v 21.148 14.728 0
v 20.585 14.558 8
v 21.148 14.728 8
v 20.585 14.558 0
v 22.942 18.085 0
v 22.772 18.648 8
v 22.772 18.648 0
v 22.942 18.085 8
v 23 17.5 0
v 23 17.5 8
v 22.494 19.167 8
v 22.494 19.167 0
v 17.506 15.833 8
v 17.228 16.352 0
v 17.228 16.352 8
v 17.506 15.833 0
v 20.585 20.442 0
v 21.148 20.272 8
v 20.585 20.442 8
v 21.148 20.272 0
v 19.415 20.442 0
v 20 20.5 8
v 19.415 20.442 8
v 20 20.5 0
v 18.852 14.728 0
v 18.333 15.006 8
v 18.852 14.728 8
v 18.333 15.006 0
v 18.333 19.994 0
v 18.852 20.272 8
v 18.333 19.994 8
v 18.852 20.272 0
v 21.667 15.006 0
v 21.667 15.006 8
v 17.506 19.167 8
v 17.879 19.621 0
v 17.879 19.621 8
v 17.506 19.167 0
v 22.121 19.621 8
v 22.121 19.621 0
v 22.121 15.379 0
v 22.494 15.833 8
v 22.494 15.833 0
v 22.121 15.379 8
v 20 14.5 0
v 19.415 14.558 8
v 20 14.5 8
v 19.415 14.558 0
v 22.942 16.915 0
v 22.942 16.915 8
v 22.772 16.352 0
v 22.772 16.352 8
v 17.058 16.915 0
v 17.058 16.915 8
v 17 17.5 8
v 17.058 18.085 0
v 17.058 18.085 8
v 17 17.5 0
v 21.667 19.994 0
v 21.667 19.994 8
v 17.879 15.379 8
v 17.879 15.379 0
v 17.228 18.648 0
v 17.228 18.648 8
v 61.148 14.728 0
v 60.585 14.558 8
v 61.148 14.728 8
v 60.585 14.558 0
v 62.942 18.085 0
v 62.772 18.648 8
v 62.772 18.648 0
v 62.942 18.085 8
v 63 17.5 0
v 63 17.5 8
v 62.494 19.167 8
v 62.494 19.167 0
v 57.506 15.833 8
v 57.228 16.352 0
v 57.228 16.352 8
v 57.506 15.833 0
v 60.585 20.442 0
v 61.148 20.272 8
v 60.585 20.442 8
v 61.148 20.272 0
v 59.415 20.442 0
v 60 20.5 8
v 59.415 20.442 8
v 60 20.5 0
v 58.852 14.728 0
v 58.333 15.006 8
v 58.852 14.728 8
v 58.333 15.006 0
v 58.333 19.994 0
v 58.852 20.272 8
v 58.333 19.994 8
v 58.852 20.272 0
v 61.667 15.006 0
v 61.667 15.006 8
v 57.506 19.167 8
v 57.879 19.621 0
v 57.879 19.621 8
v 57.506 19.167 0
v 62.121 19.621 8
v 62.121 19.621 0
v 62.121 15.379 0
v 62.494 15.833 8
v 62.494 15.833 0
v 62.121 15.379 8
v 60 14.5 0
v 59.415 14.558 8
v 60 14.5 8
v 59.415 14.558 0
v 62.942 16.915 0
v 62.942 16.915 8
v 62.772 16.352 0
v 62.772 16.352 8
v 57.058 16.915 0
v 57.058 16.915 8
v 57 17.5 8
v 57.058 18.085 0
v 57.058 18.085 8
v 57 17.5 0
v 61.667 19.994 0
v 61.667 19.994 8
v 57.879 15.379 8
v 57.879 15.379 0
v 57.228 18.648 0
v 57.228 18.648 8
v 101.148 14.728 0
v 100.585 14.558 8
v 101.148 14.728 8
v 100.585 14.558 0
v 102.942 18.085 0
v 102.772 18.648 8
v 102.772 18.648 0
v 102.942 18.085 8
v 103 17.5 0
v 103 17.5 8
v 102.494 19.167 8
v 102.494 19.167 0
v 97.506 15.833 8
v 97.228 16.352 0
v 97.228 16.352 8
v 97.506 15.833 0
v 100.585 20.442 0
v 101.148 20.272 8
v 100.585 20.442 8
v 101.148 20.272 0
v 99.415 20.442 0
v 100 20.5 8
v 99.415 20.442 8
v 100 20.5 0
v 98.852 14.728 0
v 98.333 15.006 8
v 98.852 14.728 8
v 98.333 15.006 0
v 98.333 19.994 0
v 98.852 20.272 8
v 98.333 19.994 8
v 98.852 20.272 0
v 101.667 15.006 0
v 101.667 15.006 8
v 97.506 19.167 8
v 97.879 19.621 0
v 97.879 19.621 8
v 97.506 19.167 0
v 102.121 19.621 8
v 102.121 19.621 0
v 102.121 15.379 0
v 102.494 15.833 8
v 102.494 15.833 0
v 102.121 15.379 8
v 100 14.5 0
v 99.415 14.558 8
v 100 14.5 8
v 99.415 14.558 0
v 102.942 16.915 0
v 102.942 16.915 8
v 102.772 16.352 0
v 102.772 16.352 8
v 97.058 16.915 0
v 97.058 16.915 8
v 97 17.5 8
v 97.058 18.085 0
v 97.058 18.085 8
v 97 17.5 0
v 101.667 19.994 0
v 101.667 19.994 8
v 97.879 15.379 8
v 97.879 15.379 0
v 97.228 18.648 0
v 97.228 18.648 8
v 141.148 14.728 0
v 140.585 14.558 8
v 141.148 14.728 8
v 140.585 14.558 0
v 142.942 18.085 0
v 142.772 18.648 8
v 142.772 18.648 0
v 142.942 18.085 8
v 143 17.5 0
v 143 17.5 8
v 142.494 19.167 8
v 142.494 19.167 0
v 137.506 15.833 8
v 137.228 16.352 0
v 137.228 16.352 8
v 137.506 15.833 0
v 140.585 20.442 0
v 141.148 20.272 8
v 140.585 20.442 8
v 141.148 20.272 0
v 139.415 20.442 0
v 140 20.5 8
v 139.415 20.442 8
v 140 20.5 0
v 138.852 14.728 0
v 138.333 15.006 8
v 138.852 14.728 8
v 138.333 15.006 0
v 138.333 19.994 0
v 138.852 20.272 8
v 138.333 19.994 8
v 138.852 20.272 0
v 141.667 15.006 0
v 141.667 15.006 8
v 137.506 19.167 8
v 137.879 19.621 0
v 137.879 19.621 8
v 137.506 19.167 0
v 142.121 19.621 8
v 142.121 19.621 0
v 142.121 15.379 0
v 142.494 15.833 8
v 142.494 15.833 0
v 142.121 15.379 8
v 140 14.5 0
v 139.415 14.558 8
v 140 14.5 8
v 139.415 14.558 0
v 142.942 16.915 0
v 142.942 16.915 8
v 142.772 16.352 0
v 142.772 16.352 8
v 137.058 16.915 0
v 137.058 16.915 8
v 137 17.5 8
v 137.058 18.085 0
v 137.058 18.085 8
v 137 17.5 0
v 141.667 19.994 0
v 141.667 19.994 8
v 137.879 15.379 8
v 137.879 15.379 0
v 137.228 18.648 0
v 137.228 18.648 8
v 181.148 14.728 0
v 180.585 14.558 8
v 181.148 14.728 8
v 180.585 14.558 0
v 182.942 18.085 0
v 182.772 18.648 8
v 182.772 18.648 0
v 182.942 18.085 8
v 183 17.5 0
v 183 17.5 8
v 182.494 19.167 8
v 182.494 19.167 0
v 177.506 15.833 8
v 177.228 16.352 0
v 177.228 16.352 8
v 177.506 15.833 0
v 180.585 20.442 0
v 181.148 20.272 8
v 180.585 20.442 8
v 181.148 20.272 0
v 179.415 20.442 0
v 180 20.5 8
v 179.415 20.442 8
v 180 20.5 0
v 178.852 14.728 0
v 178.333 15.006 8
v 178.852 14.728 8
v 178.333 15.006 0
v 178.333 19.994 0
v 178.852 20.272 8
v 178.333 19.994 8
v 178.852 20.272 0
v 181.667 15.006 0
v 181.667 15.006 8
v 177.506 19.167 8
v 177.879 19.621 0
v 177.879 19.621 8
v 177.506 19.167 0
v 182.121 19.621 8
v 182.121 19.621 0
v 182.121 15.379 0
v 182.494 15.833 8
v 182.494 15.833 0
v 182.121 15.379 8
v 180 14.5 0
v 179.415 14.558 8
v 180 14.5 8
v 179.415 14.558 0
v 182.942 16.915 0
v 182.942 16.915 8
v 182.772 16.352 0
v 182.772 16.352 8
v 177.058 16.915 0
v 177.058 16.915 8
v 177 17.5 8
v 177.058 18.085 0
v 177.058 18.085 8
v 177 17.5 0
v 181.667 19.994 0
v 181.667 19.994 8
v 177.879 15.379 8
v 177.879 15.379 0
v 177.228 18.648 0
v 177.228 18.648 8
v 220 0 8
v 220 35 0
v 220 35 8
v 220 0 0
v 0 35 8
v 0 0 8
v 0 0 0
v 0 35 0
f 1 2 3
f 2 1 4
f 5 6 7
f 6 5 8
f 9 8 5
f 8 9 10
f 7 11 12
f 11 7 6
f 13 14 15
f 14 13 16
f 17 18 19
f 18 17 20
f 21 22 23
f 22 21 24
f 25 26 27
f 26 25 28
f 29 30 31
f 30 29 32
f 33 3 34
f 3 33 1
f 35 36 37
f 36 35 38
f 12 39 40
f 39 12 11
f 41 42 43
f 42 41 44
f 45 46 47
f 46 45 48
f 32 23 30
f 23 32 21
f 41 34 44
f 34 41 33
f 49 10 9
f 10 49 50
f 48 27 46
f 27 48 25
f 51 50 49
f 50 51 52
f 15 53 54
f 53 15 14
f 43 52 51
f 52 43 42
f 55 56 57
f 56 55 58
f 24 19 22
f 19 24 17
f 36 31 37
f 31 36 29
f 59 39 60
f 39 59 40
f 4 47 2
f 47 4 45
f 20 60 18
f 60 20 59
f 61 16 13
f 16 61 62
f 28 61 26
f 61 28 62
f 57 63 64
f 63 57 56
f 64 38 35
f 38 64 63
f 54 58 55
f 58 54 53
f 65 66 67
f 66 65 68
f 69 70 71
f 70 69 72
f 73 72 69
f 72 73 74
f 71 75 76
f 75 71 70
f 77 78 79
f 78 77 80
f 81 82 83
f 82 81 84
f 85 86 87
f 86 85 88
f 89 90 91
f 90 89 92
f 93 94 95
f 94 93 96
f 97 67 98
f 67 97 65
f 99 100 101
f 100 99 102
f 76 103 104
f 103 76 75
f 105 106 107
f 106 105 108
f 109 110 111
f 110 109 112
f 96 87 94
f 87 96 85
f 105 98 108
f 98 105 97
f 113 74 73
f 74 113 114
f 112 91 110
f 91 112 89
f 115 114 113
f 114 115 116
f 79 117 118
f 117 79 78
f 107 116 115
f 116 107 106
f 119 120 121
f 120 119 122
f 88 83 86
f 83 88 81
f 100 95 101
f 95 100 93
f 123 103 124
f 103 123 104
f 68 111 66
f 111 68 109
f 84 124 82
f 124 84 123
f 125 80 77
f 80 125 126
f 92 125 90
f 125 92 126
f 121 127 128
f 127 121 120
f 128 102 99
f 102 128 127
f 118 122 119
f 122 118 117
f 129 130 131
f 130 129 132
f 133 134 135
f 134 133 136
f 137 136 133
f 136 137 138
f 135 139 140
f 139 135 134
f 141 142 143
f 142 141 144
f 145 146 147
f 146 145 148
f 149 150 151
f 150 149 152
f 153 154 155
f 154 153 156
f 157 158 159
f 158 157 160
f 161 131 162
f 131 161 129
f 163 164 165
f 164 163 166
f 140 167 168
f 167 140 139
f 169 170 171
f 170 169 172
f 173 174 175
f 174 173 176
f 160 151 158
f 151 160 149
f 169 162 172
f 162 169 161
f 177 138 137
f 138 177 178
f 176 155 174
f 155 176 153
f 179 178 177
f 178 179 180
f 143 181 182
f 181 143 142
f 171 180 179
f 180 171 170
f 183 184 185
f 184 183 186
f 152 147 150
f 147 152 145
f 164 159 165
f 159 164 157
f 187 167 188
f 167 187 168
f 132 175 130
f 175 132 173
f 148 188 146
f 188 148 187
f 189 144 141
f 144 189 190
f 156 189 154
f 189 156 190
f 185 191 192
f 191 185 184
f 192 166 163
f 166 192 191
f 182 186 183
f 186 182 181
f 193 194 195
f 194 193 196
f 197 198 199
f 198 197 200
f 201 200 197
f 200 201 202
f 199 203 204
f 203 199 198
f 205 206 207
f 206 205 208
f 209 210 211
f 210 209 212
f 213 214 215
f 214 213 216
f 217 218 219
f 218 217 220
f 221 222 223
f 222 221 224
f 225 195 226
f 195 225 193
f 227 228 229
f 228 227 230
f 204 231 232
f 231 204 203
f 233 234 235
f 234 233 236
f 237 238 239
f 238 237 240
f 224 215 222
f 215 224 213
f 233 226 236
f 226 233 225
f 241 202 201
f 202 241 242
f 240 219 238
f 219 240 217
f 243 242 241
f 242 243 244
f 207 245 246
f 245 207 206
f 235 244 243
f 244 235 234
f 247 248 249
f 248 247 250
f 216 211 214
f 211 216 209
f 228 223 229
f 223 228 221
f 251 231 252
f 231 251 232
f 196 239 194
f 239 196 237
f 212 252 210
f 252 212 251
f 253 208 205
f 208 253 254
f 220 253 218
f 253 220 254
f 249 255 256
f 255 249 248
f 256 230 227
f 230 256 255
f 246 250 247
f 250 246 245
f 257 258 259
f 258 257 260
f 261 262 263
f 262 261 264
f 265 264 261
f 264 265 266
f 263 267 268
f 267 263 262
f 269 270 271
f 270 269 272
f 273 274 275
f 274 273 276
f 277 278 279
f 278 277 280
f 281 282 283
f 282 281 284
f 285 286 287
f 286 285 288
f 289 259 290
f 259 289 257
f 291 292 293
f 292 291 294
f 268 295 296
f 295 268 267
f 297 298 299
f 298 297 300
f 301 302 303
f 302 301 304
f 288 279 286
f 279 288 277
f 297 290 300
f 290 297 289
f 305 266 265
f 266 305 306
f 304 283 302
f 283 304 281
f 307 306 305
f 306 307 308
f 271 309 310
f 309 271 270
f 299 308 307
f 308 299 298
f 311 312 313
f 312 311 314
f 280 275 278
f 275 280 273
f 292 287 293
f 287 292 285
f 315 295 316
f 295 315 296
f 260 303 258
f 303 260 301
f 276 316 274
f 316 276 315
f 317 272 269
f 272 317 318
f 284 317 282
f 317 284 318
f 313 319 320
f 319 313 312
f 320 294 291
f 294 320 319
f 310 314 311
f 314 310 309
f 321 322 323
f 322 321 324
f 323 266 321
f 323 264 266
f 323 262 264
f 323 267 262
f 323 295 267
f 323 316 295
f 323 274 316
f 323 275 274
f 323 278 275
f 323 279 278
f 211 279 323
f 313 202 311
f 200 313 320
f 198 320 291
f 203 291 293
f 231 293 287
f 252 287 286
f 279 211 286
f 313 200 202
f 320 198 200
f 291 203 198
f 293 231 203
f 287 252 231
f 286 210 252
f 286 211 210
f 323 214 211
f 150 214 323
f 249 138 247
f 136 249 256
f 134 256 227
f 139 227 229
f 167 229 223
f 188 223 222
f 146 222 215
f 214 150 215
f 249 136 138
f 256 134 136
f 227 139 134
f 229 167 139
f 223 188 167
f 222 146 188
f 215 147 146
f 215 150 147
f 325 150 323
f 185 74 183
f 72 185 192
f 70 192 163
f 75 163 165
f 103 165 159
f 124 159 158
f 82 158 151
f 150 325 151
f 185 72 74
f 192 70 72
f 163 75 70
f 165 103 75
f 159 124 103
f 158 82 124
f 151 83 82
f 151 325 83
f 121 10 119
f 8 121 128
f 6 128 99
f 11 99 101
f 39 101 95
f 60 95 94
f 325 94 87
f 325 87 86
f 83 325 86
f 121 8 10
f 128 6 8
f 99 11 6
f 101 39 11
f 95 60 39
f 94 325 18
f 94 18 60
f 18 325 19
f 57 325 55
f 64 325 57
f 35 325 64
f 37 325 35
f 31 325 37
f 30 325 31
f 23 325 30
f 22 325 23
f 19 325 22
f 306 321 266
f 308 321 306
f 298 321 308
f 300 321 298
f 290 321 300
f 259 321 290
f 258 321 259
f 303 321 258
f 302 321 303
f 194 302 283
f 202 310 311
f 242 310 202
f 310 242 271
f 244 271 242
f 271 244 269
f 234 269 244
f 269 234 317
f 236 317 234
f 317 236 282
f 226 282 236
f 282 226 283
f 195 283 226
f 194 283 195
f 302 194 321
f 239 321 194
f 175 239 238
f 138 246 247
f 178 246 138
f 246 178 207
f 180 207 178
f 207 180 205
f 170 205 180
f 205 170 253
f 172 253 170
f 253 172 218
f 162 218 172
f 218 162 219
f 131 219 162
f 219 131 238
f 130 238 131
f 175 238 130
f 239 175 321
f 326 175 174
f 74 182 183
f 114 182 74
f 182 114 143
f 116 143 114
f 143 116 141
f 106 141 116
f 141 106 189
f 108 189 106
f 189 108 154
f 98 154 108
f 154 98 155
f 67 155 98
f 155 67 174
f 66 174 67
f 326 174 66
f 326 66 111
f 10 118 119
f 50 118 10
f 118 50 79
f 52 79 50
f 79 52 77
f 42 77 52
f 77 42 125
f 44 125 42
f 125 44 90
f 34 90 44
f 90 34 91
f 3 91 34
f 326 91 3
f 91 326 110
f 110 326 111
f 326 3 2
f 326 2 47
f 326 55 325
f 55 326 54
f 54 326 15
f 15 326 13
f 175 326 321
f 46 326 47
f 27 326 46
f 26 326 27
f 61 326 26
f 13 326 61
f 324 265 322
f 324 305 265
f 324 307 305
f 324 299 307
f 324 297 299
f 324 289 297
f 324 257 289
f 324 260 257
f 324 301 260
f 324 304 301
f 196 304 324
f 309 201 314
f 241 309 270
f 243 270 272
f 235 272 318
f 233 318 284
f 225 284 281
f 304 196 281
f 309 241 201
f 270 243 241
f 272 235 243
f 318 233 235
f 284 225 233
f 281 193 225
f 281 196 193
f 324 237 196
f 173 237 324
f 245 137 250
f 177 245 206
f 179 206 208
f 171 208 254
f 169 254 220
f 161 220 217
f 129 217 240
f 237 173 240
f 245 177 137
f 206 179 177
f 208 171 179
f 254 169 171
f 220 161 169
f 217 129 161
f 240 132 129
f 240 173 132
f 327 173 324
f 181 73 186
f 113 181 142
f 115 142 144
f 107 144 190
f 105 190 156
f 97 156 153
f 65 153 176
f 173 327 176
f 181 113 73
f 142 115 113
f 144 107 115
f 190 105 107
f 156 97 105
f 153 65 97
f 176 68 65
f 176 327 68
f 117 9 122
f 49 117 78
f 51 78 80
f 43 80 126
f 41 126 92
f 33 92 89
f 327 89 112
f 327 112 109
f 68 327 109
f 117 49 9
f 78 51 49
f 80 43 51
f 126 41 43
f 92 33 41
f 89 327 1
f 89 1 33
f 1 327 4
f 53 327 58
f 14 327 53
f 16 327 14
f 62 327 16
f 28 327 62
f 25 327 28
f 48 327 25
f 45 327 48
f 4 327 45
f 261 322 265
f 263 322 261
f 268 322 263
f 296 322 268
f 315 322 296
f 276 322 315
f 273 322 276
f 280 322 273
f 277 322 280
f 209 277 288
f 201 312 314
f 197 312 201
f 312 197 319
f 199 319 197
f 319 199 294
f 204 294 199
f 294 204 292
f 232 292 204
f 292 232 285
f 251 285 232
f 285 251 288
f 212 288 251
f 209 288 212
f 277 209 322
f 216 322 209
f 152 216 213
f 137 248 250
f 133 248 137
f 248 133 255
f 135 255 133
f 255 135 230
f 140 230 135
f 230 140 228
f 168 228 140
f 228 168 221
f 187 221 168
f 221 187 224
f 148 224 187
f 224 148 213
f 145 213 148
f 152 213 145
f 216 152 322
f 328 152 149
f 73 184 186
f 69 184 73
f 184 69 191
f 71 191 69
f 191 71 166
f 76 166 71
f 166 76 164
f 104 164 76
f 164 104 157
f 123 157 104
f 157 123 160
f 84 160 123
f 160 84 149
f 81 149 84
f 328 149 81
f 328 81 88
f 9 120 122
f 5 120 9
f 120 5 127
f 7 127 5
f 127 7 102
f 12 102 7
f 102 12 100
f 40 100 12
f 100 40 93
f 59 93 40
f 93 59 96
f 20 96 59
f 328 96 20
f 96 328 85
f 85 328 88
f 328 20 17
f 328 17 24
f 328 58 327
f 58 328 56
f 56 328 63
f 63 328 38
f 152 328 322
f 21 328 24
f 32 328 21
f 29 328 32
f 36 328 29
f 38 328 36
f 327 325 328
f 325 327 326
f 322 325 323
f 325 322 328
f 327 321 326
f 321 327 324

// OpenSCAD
$fn = 32;

// ----------------------------------------------------------------------
// Long rail: 200-250 mm mounting rail
// ----------------------------------------------------------------------

// --- parameters (mm) ---
rail_l = 220;             // rail length, X
rail_w = 35;              // rail width, Y
rail_t = 8;               // rail thickness, Z
hole_d = 6;               // mounting hole diameter
hole_start = 20;          // first hole offset from the end
hole_pitch = 40;          // hole pitch
holes = 5;                // number of holes
fit_tol = 0.05;           // tolerance for press fits, mm
free_tol = 0.2;           // tolerance for clearance fits, mm

difference() {
  cube([rail_l, rail_w, rail_t]);
  for (i = [0 : holes - 1])
    translate([hole_start + i * hole_pitch, rail_w / 2, -1])
      cylinder(h = rail_t + 2, d = hole_d);
}
